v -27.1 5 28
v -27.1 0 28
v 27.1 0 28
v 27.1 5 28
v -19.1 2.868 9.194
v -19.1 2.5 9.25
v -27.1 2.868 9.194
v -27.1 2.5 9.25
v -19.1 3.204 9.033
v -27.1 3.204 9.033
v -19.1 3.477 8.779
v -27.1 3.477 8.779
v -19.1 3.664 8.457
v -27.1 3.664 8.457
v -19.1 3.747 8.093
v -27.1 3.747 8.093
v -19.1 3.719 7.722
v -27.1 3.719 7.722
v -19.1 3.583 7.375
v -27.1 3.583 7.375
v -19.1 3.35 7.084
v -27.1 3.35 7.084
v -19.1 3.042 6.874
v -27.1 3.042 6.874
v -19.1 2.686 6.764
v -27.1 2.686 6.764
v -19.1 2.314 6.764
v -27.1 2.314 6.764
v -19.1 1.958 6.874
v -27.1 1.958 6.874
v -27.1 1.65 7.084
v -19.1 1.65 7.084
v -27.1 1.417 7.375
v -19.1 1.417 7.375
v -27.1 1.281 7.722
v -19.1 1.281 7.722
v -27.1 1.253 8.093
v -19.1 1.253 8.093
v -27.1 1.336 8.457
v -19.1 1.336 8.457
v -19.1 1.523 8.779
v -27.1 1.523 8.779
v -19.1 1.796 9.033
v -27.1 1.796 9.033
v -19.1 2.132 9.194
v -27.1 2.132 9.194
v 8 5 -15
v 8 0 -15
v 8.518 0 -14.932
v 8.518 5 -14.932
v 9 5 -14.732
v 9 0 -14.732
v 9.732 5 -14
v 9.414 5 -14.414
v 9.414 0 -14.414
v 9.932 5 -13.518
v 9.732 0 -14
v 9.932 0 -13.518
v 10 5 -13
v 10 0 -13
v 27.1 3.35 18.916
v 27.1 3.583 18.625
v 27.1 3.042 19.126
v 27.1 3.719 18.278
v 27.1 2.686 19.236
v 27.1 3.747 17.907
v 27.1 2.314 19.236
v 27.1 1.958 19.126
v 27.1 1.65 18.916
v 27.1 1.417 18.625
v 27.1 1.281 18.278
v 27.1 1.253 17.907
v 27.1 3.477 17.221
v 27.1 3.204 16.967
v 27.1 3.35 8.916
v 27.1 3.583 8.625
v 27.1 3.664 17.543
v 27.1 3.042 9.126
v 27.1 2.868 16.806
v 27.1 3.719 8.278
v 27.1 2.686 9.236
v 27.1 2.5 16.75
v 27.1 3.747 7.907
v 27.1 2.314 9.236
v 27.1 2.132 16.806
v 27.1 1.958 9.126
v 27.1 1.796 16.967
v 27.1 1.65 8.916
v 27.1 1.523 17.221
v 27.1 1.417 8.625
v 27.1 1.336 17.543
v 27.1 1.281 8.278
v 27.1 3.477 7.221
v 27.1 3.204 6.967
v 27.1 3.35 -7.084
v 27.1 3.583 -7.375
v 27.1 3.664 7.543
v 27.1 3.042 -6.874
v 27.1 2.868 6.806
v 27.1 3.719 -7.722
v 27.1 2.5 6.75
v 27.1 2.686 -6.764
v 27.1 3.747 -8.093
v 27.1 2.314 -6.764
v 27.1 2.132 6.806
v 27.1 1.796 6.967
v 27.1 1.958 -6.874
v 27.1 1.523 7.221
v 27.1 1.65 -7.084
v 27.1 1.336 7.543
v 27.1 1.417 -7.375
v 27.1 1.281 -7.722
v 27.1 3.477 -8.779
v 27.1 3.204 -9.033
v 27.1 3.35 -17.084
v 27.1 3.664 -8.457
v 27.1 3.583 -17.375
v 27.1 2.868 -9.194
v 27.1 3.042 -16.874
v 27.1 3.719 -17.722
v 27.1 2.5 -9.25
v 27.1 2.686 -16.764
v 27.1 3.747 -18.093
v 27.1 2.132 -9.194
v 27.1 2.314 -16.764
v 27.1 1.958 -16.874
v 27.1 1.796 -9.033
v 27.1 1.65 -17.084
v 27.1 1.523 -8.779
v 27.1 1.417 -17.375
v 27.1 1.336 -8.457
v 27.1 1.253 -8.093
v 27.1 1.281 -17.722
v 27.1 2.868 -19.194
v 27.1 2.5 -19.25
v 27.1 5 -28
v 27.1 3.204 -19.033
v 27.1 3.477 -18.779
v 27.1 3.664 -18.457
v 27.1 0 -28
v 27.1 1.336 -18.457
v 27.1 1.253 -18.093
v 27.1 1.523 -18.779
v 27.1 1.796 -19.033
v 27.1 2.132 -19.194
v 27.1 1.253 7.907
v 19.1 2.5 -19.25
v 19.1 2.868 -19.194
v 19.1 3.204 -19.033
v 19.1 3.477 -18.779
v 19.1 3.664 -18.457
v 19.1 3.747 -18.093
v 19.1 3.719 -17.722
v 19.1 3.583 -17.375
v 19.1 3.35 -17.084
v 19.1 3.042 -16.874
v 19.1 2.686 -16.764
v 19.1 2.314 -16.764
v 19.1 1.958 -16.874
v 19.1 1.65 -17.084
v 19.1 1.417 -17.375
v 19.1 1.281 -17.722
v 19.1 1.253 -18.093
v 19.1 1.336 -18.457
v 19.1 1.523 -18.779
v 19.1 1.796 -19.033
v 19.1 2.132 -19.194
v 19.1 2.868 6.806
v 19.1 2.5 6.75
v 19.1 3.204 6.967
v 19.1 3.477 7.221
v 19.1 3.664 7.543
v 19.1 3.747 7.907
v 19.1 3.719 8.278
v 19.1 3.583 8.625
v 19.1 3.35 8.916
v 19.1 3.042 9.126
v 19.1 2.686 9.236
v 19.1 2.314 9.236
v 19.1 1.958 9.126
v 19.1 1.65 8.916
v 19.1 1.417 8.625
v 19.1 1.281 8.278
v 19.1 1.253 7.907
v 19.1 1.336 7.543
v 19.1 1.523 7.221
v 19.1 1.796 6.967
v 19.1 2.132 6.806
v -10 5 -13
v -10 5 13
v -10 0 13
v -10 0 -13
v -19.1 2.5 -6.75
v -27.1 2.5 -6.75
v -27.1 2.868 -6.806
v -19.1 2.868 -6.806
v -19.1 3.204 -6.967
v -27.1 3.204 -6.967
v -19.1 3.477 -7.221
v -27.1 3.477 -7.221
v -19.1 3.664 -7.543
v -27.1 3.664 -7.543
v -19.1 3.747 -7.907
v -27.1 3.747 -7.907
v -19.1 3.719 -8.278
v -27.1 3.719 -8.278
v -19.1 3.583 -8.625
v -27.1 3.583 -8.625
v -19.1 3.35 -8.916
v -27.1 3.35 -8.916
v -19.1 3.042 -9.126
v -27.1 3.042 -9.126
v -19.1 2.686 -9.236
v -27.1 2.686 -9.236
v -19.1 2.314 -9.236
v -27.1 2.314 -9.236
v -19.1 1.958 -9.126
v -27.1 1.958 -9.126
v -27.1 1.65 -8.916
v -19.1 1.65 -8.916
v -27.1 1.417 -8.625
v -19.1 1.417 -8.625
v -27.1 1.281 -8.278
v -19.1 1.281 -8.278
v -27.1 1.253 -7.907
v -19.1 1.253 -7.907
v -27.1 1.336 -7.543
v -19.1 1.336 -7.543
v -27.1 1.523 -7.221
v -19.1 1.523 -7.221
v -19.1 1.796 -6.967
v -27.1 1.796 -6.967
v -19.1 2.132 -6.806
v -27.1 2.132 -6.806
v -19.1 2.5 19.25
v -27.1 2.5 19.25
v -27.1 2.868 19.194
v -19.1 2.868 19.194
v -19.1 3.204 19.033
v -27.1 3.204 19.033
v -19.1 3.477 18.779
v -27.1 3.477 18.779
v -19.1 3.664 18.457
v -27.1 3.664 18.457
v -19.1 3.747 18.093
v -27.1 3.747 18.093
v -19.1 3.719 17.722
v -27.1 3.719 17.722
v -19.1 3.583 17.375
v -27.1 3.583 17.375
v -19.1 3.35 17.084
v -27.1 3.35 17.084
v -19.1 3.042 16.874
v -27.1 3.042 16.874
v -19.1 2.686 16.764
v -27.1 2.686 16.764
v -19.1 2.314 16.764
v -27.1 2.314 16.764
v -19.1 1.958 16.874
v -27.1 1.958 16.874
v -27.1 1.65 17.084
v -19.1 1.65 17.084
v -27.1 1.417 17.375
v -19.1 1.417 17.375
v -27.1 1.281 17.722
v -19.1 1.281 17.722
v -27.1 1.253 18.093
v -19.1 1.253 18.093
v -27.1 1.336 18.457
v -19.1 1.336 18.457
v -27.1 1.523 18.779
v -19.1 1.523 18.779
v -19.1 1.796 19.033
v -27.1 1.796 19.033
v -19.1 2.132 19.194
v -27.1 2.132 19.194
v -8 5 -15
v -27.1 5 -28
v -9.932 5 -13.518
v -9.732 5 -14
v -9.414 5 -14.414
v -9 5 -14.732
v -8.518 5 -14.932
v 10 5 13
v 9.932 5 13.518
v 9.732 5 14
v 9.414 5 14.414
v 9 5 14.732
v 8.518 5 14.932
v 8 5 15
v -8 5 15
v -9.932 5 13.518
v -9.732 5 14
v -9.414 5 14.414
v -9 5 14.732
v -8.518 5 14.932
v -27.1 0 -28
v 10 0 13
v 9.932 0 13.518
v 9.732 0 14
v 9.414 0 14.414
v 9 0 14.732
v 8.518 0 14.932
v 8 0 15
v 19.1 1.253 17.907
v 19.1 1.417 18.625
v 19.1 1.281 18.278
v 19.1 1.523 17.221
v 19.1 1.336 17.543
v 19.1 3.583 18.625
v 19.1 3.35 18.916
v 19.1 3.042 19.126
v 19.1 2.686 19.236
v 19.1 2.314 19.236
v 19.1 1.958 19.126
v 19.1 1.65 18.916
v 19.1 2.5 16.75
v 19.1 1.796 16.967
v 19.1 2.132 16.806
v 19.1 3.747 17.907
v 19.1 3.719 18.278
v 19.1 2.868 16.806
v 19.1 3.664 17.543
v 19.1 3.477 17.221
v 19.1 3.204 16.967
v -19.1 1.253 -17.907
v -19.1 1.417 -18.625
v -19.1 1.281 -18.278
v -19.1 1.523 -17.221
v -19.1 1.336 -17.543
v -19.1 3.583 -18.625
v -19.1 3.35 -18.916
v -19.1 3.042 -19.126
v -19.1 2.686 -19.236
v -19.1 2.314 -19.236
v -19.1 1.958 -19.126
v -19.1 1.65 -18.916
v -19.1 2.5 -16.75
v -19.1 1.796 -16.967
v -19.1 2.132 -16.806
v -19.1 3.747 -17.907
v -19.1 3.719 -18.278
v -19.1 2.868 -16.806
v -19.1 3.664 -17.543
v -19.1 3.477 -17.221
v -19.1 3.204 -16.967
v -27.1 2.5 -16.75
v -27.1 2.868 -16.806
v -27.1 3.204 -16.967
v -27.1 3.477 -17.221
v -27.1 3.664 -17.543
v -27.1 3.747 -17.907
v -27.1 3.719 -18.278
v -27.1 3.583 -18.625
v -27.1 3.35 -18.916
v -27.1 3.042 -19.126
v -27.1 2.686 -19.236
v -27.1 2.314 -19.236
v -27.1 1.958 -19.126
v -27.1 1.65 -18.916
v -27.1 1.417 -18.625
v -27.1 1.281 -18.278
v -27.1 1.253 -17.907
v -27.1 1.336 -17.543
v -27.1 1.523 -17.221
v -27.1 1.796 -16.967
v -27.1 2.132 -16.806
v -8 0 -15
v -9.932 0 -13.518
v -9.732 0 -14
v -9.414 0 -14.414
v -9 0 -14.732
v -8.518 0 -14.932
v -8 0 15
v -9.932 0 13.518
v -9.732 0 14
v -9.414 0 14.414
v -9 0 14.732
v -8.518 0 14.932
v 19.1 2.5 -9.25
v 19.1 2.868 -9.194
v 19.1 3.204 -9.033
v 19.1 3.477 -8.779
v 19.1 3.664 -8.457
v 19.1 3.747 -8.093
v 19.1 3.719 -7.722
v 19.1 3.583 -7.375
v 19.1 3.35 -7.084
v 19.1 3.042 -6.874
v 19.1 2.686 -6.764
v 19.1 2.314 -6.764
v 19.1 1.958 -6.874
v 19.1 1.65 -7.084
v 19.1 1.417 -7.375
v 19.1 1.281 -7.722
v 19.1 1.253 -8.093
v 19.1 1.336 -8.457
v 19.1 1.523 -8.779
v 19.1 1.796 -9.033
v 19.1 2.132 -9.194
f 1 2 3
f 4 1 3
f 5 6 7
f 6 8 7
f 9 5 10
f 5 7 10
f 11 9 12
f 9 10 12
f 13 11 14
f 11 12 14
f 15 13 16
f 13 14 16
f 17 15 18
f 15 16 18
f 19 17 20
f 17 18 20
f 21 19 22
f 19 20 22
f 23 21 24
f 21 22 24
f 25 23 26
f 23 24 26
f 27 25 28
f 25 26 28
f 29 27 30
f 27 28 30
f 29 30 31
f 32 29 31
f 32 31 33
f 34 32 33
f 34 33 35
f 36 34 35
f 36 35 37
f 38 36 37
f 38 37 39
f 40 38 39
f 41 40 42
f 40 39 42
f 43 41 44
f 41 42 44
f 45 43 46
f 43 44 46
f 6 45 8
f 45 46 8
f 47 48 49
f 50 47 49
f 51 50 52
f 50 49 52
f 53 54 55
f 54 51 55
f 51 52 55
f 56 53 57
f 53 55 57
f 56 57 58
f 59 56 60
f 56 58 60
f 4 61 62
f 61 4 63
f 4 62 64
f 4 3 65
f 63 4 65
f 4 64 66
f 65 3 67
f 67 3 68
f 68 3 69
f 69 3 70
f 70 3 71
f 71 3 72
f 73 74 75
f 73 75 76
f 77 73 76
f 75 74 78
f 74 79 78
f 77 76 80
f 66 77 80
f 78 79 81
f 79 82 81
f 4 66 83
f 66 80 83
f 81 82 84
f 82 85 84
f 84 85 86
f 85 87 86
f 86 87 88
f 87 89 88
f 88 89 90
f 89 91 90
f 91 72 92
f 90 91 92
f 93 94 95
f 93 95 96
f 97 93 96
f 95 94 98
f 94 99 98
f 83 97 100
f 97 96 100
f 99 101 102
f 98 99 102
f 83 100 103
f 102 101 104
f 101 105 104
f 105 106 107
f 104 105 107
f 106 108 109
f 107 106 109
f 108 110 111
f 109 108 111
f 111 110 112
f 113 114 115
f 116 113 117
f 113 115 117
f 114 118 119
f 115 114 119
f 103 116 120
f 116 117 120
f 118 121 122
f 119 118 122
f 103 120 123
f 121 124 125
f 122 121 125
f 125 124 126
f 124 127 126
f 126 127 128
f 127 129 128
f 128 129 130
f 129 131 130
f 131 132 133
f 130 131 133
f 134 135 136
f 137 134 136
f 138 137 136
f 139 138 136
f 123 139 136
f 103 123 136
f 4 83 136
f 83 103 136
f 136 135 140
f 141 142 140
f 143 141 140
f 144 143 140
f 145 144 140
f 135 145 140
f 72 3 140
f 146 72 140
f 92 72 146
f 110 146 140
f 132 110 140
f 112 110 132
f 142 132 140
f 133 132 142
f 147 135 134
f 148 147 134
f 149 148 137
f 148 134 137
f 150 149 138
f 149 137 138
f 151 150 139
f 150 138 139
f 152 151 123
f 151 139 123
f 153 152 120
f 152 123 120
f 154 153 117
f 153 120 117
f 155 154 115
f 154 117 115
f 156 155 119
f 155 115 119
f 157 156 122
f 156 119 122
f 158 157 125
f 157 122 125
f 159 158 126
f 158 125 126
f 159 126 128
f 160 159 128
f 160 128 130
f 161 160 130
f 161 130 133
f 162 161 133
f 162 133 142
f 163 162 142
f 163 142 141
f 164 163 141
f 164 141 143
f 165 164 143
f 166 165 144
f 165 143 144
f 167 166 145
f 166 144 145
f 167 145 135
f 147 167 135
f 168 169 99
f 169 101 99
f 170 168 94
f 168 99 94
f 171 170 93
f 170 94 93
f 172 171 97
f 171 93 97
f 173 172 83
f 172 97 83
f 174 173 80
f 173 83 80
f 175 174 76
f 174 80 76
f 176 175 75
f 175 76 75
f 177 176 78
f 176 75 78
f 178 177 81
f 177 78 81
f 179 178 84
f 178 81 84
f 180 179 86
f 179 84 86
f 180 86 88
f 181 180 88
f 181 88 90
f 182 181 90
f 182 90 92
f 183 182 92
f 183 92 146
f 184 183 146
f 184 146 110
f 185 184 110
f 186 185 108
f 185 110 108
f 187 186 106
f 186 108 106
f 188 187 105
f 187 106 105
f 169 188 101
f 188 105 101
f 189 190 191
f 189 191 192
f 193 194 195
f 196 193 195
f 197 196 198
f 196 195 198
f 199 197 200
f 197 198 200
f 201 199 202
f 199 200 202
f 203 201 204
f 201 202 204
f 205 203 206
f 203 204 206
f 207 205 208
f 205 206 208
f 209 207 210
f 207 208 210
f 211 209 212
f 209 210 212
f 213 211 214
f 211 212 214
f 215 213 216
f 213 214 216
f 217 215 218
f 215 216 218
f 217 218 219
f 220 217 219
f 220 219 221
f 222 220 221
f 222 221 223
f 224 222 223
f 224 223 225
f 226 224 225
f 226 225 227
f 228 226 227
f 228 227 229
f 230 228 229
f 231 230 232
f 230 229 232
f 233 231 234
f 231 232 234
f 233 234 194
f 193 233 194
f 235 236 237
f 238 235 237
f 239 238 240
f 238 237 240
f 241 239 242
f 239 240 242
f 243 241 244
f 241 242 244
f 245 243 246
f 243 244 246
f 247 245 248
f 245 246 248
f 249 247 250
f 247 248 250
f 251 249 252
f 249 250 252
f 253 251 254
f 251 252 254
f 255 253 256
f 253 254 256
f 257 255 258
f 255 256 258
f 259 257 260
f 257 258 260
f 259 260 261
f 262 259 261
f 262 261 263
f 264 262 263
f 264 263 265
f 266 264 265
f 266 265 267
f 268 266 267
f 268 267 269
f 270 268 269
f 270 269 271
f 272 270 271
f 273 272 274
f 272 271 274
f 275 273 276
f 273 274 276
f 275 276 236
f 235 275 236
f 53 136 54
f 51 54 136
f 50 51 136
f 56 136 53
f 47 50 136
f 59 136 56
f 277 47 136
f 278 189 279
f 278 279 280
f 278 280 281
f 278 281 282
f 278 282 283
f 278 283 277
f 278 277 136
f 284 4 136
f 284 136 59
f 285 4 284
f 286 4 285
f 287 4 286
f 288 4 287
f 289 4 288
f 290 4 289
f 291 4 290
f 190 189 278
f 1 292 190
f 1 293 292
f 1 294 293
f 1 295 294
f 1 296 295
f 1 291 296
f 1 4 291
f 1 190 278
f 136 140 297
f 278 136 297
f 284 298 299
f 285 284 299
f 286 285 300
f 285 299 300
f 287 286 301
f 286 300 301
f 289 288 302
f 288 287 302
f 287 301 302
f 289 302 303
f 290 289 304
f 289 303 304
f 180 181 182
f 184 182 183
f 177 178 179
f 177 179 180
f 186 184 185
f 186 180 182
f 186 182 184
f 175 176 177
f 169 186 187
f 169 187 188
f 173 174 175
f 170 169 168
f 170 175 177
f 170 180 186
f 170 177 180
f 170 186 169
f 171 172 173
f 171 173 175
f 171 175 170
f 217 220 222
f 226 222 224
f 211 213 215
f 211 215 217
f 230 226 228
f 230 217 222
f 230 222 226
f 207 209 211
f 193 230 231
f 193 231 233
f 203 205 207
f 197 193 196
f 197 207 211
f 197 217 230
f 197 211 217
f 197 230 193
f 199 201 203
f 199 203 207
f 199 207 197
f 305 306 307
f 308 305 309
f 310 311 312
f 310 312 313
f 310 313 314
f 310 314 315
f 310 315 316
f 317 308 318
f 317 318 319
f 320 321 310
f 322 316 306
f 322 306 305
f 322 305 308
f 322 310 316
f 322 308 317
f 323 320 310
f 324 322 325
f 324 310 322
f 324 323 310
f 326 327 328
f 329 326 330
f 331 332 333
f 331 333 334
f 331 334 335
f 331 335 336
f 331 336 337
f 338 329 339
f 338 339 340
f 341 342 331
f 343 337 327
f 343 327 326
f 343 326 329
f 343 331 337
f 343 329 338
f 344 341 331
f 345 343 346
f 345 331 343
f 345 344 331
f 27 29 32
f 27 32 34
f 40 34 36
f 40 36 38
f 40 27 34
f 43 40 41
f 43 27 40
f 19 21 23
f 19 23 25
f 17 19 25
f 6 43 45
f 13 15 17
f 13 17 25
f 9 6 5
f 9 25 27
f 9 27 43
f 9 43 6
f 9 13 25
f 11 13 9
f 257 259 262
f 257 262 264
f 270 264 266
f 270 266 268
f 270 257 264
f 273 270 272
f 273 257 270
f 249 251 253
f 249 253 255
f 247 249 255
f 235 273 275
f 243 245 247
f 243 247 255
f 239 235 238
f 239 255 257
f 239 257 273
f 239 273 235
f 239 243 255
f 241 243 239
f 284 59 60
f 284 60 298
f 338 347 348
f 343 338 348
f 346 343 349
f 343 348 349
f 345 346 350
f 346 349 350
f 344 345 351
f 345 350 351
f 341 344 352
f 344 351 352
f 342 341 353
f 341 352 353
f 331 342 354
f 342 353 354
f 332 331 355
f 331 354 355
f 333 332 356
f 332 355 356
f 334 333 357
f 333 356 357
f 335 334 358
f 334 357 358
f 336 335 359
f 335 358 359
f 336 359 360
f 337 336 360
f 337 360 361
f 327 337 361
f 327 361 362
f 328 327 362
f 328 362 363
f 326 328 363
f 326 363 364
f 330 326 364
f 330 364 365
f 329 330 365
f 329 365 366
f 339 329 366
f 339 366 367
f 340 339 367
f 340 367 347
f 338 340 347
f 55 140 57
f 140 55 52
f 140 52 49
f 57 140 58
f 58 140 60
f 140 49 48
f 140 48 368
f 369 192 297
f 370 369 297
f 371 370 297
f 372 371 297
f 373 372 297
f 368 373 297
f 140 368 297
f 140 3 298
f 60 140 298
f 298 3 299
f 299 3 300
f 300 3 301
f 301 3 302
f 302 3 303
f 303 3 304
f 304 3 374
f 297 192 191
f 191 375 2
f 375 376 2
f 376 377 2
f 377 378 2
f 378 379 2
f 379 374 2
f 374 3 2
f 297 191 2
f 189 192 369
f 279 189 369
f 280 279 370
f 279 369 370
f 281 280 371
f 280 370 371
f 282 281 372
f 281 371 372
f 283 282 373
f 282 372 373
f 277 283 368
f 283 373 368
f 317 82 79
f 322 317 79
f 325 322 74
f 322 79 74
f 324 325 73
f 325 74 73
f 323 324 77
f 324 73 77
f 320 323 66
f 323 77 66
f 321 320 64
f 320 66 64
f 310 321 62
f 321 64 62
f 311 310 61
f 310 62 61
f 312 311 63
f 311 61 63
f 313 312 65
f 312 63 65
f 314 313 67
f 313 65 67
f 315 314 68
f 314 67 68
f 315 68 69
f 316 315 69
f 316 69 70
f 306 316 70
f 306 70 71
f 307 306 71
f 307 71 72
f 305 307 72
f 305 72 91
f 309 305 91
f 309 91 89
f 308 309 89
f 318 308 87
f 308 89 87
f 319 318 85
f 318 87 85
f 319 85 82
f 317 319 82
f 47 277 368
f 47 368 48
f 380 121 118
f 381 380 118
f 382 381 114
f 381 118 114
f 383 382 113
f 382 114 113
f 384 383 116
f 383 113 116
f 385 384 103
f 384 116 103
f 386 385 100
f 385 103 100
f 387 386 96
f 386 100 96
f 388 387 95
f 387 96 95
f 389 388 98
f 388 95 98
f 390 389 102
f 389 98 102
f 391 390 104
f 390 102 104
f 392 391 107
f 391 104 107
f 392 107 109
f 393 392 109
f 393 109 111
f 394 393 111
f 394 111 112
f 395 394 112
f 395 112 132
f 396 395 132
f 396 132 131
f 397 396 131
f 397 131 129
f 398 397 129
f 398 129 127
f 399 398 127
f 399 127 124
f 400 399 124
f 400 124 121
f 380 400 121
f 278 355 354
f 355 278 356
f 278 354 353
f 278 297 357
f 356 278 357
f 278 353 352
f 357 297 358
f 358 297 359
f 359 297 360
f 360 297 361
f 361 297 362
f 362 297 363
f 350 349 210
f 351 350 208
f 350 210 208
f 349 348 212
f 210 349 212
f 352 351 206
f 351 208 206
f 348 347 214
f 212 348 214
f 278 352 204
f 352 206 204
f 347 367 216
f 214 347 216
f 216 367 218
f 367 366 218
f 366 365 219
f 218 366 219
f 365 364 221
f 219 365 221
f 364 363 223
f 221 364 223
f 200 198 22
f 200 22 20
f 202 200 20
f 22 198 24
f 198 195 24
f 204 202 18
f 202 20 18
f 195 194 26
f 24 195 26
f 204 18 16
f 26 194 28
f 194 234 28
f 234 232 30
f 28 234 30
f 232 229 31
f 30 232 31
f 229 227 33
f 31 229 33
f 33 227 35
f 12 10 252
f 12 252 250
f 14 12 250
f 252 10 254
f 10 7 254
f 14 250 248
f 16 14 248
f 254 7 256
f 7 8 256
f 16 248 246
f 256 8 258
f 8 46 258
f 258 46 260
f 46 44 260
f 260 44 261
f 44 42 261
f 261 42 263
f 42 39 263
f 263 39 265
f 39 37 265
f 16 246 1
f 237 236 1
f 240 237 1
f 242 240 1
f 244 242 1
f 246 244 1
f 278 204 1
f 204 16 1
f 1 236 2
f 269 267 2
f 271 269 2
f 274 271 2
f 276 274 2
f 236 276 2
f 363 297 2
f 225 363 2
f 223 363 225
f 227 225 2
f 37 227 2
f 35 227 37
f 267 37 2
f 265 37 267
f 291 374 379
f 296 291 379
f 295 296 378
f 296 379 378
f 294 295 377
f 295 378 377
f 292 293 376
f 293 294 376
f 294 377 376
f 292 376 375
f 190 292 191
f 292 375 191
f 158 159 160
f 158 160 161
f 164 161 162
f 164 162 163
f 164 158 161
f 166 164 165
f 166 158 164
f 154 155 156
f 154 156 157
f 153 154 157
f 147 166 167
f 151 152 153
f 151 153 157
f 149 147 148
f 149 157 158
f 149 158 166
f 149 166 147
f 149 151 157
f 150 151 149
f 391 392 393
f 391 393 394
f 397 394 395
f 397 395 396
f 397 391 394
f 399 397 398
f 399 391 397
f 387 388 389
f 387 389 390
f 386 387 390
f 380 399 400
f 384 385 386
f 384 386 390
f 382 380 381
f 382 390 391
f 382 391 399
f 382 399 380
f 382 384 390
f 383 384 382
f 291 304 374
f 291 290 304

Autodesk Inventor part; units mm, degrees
ref_plane "YZ Plane" through (0, 0, 0) normal (1, 0, 0) x (0, 1, 0)
ref_plane "XZ Plane" through (0, 0, 0) normal (0, 1, 0) x (-1, 0, 0)
ref_plane "XY Plane" through (0, 0, 0) normal (0, 0, 1) x (1, 0, 0)
sketch "스케치1" plane through (0, 0, 0) normal (0, 1, 0) x (-1, 0, 0)
  line L0 (27.1, 28) -> (-27.1, 28)
  line L1 (-27.1, 28) -> (-27.1, -28)
  line L2 (-27.1, -28) -> (27.1, -28)
  line L3 (27.1, -28) -> (27.1, 28)
  point P0 (0, 0)
  dimension "d0" = 54.2
  dimension "d1" = 56
  dimension "d2" = 27.1
  dimension "d3" = 28
extrude "돌출1" add sketch "스케치1" along normal blind 5
sketch "스케치5" plane through (27.1, 0, 28) normal (1, 0, 0) x (0, 0, -1)
  line L0 (0, 0) -> (56, 0) projected
  line L1 (56, 0) -> (56, 5) projected
  line L2 (0, 5) -> (56, 5) projected
  line L3 (0, 0) -> (0, 5) projected
  circle A0 centre (10, 2.5) radius 1.25
  circle A1 centre (20, 2.5) radius 1.25
  circle A2 centre (46, 2.5) radius 1.25
  circle A3 centre (36, 2.5) radius 1.25
  point P0 (28, 0)
  dimension "d16" = 2.5
  dimension "d17" = 2.5
  dimension "d18" = 2.5
  dimension "d19" = 2.5
  dimension "d20" = 2.5
  dimension "d21" = 2.5
  dimension "d22" = 2.5
  dimension "d23" = 2.5
  dimension "d24" = 10
  dimension "d25" = 20
  dimension "d26" = 20
  dimension "d27" = 10
extrude "돌출5" cut sketch "스케치5" against normal blind 8 contours A0 | A1 | A2 | A3
sketch "스케치6" plane through (-27.1, 0, -28) normal (-1, 0, 0) x (0, 0, 1)
  circle A0 centre (10, 2.5) radius 1.25 projected
  circle A1 centre (46, 2.5) radius 1.25 projected
  circle A2 centre (36, 2.5) radius 1.25 projected
  circle A3 centre (20, 2.5) radius 1.25 projected
  line L0 (56, 0) -> (0, 0) projected
  line L1 (0, 0) -> (0, 5) projected
  line L2 (56, 5) -> (0, 5) projected
  line L3 (56, 0) -> (56, 5) projected
  point P0 (28, 0)
extrude "돌출6" cut sketch "스케치6" against normal blind 8 contours A0 | A1 | A2 | A3
sketch "스케치7" plane through (0, 5, 0) normal (0, 1, 0) x (1, 0, 0)
  line L0 (-10, 15) -> (10, 15)
  line L1 (10, 15) -> (10, -15)
  line L2 (10, -15) -> (-10, -15)
  line L3 (-10, -15) -> (-10, 15)
  point P0 (0, 0)
  dimension "d32" = 20
  dimension "d33" = 30
  dimension "d34" = 10
  dimension "d35" = 15
extrude "돌출7" cut sketch "스케치7" against normal up to surface (5 mm away)
fillet "모깎기1" radius 2 4 edges at (-10, 2.5, -15) (10, 2.5, -15) (-10, 2.5, 15) (10, 2.5, 15)
equation "\"d2\" = 0.5 * d0"
equation "\"d3\" = 0.5 * d1"
equation "\"d34\" = 0.5 * d32"
equation "\"d35\" = 0.5 * d33"
properties part number "J1J2_Bottom" material "알루미늄 6061"
